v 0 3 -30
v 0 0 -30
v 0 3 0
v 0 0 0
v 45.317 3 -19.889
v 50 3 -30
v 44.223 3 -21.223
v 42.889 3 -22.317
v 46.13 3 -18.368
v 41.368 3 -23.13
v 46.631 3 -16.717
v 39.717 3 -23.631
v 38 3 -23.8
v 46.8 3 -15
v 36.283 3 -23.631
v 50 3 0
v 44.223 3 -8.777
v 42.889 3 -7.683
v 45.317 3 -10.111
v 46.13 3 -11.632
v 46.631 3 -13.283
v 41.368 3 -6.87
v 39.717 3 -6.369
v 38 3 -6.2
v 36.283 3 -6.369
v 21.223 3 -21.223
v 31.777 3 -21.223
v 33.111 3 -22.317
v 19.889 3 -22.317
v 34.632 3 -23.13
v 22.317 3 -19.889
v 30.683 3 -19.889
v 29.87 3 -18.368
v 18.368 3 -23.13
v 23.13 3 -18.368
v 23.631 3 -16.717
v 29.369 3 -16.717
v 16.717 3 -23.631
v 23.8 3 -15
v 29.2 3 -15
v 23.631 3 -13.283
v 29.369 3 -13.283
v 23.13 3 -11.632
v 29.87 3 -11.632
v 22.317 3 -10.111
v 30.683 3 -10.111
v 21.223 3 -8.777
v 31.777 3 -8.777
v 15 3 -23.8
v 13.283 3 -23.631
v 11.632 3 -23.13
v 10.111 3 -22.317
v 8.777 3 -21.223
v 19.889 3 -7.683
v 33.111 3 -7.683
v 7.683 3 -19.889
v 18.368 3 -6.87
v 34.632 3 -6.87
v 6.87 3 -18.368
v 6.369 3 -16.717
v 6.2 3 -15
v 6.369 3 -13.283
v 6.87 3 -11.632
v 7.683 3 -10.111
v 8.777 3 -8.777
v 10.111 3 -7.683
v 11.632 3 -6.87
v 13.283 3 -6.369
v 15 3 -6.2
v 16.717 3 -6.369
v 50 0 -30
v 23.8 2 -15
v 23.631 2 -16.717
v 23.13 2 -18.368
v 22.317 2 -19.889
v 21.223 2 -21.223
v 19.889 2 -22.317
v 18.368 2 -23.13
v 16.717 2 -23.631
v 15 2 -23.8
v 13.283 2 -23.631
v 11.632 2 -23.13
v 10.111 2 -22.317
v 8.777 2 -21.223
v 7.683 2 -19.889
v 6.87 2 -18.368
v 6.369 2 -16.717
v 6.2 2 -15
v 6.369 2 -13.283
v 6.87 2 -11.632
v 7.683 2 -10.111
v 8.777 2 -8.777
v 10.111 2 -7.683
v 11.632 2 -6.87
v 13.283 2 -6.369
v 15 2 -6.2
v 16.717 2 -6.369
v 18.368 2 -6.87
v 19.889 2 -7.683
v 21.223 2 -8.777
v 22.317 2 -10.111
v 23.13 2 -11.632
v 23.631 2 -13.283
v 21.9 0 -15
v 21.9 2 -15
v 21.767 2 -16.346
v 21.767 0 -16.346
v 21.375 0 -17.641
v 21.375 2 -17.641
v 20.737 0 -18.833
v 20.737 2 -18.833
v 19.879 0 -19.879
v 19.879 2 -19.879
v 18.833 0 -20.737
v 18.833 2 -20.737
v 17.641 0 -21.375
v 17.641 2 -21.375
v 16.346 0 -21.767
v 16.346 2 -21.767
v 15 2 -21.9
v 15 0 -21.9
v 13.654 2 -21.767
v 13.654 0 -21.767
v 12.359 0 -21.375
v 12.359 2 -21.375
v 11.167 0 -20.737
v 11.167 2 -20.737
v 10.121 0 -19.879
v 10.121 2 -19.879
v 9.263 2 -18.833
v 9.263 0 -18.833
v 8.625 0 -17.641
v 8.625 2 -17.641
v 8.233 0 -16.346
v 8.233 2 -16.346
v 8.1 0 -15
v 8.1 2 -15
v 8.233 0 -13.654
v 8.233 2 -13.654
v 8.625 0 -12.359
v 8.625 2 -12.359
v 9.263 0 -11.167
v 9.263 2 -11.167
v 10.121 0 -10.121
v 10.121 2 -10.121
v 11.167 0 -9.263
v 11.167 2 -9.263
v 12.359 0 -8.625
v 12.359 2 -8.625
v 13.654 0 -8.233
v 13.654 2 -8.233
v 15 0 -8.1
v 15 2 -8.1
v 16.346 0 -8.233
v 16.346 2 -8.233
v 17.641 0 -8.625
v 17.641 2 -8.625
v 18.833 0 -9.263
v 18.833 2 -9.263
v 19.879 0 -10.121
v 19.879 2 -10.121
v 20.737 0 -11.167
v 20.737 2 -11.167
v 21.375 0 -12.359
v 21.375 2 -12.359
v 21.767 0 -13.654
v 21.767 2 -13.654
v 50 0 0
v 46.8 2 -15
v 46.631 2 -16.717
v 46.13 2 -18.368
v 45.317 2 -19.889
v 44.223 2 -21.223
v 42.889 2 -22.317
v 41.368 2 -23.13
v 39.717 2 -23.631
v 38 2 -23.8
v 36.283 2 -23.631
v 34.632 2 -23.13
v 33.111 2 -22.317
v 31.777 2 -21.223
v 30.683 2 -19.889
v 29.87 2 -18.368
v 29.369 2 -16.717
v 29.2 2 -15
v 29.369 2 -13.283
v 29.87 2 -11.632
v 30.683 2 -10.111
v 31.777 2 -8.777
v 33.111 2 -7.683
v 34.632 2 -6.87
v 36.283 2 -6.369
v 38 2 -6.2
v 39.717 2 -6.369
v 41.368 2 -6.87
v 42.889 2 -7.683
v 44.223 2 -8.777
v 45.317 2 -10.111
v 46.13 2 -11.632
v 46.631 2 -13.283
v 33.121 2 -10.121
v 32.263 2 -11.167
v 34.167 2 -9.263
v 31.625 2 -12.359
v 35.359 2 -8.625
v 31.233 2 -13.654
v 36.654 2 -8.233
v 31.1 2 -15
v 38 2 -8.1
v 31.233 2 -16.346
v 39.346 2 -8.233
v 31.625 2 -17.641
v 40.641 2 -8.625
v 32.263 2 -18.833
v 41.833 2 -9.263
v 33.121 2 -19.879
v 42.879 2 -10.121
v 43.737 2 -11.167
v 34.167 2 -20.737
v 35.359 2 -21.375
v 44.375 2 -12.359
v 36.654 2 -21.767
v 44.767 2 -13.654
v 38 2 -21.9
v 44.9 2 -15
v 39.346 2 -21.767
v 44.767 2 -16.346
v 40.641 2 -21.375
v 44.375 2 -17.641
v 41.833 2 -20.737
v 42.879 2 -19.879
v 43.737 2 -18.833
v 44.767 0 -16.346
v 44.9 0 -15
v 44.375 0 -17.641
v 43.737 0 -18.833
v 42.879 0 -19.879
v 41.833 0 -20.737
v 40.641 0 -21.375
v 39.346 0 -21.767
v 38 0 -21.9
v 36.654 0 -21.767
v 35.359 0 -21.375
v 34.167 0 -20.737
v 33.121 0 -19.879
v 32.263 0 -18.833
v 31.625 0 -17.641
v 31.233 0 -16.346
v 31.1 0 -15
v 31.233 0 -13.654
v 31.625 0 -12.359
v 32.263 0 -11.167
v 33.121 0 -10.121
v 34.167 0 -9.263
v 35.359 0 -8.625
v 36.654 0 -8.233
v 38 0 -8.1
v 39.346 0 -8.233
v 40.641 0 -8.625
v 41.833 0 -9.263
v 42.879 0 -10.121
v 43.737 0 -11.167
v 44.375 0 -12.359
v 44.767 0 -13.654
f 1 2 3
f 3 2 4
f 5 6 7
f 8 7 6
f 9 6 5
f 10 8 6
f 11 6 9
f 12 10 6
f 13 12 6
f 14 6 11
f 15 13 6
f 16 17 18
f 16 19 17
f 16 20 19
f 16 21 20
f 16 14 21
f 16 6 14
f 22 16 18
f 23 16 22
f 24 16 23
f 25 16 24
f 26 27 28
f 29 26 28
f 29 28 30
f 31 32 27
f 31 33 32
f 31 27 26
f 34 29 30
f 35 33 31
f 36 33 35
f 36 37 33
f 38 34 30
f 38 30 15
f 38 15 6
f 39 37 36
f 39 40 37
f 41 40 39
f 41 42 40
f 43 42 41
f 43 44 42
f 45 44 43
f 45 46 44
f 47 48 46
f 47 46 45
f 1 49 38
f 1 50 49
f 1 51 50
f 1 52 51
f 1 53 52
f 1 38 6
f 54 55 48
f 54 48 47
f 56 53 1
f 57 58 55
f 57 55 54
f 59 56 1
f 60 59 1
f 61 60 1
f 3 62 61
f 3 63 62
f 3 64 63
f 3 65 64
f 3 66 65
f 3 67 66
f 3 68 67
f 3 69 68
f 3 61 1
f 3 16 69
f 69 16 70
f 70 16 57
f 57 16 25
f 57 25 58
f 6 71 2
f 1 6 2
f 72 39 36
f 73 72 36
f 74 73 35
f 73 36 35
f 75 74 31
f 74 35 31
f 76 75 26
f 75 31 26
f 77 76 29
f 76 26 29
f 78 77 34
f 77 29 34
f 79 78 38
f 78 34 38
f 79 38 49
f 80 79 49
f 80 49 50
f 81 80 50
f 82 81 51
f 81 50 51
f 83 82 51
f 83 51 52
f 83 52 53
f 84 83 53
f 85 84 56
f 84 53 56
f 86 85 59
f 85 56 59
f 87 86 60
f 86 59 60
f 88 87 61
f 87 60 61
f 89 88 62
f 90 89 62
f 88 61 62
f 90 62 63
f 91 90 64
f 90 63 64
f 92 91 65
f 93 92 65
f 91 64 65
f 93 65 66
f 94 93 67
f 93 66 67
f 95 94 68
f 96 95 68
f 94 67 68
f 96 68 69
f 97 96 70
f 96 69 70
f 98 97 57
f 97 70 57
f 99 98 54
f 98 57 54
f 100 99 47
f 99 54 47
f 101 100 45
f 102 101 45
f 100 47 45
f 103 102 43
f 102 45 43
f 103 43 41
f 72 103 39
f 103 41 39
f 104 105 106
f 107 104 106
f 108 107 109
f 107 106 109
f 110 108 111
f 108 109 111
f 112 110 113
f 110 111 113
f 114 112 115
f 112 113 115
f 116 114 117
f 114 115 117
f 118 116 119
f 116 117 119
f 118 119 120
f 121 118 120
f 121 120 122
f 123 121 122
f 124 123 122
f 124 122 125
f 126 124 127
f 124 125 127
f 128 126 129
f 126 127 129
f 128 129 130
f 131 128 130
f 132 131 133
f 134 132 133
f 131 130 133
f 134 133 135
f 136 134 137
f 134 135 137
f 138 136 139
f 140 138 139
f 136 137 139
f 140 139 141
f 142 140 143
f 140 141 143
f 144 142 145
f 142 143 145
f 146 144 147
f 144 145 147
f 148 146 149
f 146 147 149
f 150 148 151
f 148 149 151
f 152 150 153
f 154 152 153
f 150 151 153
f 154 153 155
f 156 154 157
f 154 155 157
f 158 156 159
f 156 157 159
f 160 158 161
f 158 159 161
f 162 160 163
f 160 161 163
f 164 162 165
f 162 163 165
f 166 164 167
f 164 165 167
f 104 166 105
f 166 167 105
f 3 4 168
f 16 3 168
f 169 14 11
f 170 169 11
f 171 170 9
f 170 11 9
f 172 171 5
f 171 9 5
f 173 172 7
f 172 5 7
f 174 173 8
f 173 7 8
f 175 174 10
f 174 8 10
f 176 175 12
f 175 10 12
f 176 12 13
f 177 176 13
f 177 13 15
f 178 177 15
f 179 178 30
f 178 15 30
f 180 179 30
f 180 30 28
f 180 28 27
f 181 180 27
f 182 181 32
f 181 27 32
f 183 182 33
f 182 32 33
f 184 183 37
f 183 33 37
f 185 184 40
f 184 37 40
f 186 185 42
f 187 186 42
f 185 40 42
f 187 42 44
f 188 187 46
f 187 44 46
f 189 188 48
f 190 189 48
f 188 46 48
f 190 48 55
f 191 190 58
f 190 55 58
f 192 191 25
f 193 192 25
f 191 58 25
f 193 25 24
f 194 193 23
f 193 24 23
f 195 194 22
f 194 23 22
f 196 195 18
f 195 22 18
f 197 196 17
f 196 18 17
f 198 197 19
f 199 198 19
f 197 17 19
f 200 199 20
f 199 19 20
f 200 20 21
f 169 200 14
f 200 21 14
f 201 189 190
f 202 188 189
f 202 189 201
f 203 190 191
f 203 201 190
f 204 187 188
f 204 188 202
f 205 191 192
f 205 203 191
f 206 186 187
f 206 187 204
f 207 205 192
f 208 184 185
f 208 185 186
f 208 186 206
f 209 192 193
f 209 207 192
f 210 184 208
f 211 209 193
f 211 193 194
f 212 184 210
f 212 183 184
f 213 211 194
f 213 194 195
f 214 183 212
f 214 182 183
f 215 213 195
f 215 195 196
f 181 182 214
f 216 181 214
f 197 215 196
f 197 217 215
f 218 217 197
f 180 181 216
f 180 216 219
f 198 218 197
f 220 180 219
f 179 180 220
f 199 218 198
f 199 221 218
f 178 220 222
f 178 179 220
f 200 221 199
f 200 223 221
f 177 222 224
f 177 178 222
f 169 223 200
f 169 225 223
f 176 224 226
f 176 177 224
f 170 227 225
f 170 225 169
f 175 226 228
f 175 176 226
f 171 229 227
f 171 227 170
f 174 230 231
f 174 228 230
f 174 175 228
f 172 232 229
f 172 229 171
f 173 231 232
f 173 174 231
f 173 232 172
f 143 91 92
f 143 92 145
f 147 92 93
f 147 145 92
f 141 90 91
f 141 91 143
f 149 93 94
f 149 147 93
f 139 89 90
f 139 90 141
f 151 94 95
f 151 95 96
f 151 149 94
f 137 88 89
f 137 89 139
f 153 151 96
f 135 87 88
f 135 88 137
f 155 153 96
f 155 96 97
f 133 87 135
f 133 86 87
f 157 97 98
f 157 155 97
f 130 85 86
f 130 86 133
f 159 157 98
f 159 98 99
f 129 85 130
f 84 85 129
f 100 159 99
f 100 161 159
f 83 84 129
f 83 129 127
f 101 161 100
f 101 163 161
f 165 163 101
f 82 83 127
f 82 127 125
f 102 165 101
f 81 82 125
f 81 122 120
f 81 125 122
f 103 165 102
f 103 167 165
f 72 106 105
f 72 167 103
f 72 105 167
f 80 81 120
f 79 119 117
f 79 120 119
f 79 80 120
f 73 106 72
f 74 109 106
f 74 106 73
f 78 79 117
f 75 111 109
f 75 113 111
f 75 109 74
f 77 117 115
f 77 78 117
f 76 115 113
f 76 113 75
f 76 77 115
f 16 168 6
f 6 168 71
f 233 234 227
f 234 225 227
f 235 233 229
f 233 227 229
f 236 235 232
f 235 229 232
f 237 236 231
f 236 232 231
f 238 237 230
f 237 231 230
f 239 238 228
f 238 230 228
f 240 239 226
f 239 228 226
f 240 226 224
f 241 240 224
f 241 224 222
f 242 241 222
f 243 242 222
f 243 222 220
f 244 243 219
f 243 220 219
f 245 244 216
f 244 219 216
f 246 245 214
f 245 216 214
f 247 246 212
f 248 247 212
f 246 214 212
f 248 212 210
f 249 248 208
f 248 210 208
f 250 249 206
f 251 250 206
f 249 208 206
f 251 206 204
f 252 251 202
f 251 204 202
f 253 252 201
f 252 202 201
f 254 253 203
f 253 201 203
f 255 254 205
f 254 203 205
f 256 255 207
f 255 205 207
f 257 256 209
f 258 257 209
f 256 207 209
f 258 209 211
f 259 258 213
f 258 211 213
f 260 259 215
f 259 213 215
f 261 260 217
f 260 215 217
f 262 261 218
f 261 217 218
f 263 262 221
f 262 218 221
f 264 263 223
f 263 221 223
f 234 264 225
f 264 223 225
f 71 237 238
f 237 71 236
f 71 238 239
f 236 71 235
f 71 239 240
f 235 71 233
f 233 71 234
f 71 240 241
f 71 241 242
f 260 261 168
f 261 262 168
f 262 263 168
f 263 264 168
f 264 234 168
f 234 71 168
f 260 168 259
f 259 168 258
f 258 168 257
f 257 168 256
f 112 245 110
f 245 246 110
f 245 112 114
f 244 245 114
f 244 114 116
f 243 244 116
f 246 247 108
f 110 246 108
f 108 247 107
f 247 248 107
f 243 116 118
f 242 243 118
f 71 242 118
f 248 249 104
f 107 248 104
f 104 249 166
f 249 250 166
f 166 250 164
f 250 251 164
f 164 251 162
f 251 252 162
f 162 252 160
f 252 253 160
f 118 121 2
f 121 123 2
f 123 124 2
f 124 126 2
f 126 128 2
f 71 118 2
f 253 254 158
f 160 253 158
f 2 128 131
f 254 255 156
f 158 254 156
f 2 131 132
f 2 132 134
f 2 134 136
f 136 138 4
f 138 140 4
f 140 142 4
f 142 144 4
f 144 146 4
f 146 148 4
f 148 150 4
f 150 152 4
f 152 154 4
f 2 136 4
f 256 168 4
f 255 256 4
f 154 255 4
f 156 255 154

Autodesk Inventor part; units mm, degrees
ref_plane "YZ Plane" through (0, 0, 0) normal (1, 0, 0) x (0, 1, 0)
ref_plane "XZ Plane" through (0, 0, 0) normal (0, 1, 0) x (-1, 0, 0)
ref_plane "XY Plane" through (0, 0, 0) normal (0, 0, 1) x (1, 0, 0)
sketch "Sketch1" plane through (0, 0, 0) normal (0, 1, 0) x (-1, 0, 0)
  line L0 (0, 0) -> (-50, 0)
  line L1 (-50, 0) -> (-50, -30)
  line L2 (-50, -30) -> (0, -30)
  line L3 (0, -30) -> (0, 0)
  dimension "d0" = 50
  dimension "d1" = 30
extrude "Extrusion1" add sketch "Sketch1" along normal blind 3
sketch "Sketch2" plane through (0, 3, 0) normal (0, 1, 0) x (1, 0, 0)
  circle A0 centre (15, 15) radius 8.8
  line L0 (0, 30) -> (0, 0) projected
  line L1 (0, 0) -> (50, 0) projected
  circle A1 centre (38, 15) radius 8.8
  dimension "d4" = 17.6
  dimension "d5" = 15
  dimension "d6" = 15
  dimension "d12" = 17.6
  dimension "d16" = 0
  dimension "d17" = 23
extrude "Extrusion2" cut sketch "Sketch2" against normal blind 1
sketch "Sketch3" plane through (15, 2, -15) normal (0, 1, 0) x (1, 0, 0)
  circle A0 centre (0, 0) radius 6.9
  circle A1 centre (23, 0) radius 6.9
  circle A2 centre (23, 0) radius 8.8 projected
  point P0 (-15, -15)
  point P1 (-13.4125, -13.4125)
  dimension "d9" = 13.8
  dimension "d13" = 13.8
  dimension "d14" = 0
  dimension "d15" = 0
extrude "Extrusion3" cut sketch "Sketch3" against normal through all contours A0 | A1
properties part number "Proto_Valve_Fitting_TestPlate"
